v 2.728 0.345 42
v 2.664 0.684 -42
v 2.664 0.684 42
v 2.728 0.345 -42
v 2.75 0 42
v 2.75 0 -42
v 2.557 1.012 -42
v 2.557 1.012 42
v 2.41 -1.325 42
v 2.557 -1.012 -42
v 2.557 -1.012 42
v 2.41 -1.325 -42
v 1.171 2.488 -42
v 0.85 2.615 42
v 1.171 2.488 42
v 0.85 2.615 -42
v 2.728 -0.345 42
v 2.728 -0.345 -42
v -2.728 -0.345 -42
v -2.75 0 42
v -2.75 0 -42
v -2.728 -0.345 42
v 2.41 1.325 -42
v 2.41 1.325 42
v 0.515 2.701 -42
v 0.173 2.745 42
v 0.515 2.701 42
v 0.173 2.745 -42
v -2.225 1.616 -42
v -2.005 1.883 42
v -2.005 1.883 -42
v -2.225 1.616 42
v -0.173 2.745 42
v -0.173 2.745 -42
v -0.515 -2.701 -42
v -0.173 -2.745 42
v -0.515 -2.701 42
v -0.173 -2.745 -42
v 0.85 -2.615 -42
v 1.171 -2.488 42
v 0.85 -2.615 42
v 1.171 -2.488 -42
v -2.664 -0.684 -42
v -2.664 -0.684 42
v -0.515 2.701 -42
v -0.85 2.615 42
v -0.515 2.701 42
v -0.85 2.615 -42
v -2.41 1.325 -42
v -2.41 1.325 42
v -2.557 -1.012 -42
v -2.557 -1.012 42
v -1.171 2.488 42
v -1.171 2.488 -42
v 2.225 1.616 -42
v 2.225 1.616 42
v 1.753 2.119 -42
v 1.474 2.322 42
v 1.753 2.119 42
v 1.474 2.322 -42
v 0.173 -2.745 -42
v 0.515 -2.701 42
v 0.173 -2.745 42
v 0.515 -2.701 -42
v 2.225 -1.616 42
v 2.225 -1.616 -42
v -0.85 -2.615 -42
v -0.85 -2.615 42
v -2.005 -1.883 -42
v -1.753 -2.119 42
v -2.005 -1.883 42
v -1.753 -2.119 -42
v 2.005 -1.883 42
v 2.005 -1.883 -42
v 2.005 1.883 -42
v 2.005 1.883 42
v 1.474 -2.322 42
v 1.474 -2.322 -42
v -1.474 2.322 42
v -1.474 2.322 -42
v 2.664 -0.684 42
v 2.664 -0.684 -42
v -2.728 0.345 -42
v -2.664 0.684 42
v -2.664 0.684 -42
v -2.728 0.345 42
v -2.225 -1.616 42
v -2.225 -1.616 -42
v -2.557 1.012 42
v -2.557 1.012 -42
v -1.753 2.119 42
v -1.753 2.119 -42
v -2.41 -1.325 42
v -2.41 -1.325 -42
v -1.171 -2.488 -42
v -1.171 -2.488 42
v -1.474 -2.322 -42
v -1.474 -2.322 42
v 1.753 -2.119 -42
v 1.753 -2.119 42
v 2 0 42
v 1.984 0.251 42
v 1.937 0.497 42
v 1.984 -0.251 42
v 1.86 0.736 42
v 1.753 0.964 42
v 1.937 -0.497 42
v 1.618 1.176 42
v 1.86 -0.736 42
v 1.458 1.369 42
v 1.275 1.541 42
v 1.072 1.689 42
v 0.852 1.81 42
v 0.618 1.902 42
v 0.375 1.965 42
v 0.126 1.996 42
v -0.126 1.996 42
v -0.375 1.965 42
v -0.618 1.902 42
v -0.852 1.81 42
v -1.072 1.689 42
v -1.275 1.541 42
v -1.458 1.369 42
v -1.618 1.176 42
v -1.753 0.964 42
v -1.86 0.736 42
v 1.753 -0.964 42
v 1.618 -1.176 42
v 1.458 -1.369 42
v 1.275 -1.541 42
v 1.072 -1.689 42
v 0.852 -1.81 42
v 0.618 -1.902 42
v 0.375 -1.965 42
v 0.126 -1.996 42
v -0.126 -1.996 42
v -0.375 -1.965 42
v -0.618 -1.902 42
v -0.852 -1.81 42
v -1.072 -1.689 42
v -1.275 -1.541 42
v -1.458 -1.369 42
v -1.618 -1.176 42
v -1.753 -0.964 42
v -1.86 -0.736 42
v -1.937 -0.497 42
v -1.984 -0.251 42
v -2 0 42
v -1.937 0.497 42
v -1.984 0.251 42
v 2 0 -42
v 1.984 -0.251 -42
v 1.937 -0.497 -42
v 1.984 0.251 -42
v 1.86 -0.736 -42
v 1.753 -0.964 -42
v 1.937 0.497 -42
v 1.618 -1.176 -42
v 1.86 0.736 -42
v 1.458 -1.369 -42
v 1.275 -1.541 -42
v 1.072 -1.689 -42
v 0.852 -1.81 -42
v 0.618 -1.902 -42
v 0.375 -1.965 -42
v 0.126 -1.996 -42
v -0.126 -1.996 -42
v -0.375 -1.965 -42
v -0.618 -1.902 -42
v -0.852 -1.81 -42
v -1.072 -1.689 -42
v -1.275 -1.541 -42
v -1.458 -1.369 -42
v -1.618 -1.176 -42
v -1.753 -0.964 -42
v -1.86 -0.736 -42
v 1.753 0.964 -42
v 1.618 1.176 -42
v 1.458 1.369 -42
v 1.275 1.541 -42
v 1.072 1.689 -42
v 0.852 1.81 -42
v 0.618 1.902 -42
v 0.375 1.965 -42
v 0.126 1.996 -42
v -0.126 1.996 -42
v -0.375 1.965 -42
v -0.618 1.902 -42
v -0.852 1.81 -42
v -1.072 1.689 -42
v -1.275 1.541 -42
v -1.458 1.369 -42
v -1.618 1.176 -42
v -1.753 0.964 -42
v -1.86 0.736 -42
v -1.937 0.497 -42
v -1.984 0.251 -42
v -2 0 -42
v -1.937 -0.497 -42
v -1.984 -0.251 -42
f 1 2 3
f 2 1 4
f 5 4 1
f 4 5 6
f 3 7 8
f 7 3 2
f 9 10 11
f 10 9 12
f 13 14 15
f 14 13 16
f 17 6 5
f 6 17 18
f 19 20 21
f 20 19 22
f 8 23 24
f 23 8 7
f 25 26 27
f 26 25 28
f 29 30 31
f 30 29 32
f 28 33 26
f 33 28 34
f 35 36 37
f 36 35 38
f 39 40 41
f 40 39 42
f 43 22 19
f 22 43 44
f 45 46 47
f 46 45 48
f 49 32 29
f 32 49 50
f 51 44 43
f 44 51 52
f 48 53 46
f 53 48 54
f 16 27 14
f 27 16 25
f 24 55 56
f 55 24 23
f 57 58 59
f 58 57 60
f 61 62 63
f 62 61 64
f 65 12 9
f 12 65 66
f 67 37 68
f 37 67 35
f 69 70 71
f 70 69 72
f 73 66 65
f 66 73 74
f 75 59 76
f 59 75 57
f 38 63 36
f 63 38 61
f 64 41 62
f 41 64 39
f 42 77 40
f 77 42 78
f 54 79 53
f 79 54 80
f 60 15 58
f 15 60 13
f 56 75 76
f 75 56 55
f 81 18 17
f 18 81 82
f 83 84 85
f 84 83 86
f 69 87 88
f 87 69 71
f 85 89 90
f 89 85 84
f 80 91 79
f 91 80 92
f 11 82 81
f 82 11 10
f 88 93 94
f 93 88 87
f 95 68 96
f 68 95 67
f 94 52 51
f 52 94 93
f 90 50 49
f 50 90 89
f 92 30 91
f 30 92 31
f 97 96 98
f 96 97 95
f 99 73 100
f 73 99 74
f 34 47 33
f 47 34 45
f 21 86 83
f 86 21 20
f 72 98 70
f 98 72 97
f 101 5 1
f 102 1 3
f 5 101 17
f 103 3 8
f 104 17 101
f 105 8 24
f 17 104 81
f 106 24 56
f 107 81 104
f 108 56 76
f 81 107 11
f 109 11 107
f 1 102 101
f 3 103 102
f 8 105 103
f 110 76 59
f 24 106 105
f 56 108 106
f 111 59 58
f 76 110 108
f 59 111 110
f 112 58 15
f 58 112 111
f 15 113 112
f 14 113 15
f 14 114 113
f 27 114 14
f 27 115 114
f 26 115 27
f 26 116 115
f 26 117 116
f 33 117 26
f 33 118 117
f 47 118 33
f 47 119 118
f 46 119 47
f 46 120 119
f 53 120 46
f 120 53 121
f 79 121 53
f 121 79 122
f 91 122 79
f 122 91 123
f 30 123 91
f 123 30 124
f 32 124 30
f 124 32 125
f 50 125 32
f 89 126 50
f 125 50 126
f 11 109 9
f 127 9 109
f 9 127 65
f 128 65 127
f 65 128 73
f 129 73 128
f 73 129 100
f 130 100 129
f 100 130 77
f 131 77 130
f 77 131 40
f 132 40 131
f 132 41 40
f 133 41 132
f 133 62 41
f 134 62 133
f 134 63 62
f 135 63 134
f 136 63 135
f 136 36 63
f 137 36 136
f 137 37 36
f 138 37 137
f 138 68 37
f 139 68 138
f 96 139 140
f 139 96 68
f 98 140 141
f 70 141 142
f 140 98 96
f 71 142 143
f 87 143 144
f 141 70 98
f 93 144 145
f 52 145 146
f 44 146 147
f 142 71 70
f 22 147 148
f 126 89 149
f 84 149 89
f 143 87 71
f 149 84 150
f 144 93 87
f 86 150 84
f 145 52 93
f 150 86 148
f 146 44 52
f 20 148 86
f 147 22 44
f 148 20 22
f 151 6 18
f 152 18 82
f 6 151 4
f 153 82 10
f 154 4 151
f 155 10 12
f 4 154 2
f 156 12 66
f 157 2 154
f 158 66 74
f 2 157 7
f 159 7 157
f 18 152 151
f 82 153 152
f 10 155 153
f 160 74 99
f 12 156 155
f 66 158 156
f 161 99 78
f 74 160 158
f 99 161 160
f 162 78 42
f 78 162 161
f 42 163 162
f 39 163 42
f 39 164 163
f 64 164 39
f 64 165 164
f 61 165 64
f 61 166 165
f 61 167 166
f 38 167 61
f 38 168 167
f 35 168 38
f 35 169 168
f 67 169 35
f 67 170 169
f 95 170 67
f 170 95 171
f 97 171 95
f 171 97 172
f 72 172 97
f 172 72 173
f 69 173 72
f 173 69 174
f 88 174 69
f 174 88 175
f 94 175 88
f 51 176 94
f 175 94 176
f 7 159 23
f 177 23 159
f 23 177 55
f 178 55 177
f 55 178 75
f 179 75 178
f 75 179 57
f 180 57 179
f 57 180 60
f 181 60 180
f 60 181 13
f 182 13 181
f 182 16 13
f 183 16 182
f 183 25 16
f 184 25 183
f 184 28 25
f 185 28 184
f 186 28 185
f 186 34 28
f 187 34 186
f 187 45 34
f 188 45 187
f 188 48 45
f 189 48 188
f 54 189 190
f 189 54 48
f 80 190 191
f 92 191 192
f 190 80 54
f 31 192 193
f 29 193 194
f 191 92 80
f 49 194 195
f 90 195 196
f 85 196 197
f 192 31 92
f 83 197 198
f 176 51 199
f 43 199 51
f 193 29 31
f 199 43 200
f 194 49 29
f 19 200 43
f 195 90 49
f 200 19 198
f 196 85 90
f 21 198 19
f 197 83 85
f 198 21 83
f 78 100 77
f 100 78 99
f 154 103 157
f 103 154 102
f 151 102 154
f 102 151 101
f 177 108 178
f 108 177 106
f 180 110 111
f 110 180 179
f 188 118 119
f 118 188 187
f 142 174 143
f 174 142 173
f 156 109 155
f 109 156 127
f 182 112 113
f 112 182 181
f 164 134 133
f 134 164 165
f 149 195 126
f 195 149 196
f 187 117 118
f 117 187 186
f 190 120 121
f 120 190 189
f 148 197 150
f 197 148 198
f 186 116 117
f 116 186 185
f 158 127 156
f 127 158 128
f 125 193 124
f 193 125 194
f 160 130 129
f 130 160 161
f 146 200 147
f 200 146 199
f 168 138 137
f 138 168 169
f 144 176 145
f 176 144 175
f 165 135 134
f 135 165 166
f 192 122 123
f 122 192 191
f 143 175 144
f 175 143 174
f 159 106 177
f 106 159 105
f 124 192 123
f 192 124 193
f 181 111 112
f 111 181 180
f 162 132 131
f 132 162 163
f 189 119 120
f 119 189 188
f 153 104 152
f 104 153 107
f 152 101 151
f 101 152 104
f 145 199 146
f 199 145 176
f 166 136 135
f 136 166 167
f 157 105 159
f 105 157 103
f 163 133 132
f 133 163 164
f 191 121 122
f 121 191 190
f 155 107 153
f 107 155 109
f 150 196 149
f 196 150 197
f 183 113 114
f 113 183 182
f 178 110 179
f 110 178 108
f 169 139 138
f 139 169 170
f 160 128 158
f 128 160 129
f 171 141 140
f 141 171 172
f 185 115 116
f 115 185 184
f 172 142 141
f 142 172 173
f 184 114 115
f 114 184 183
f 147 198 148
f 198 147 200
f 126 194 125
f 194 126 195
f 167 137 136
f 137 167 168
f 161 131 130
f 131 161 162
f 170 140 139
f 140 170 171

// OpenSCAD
$fn = 50;


difference() {
	union() {
		translate(v = [0, 0, -42.0000000000]) {
			cylinder(h = 84, r = 2.7500000000);
		}
	}
	union() {
		translate(v = [0, 0, -100.0000000000]) {
			cylinder(h = 200, r = 2.0000000000);
		}
	}
}
